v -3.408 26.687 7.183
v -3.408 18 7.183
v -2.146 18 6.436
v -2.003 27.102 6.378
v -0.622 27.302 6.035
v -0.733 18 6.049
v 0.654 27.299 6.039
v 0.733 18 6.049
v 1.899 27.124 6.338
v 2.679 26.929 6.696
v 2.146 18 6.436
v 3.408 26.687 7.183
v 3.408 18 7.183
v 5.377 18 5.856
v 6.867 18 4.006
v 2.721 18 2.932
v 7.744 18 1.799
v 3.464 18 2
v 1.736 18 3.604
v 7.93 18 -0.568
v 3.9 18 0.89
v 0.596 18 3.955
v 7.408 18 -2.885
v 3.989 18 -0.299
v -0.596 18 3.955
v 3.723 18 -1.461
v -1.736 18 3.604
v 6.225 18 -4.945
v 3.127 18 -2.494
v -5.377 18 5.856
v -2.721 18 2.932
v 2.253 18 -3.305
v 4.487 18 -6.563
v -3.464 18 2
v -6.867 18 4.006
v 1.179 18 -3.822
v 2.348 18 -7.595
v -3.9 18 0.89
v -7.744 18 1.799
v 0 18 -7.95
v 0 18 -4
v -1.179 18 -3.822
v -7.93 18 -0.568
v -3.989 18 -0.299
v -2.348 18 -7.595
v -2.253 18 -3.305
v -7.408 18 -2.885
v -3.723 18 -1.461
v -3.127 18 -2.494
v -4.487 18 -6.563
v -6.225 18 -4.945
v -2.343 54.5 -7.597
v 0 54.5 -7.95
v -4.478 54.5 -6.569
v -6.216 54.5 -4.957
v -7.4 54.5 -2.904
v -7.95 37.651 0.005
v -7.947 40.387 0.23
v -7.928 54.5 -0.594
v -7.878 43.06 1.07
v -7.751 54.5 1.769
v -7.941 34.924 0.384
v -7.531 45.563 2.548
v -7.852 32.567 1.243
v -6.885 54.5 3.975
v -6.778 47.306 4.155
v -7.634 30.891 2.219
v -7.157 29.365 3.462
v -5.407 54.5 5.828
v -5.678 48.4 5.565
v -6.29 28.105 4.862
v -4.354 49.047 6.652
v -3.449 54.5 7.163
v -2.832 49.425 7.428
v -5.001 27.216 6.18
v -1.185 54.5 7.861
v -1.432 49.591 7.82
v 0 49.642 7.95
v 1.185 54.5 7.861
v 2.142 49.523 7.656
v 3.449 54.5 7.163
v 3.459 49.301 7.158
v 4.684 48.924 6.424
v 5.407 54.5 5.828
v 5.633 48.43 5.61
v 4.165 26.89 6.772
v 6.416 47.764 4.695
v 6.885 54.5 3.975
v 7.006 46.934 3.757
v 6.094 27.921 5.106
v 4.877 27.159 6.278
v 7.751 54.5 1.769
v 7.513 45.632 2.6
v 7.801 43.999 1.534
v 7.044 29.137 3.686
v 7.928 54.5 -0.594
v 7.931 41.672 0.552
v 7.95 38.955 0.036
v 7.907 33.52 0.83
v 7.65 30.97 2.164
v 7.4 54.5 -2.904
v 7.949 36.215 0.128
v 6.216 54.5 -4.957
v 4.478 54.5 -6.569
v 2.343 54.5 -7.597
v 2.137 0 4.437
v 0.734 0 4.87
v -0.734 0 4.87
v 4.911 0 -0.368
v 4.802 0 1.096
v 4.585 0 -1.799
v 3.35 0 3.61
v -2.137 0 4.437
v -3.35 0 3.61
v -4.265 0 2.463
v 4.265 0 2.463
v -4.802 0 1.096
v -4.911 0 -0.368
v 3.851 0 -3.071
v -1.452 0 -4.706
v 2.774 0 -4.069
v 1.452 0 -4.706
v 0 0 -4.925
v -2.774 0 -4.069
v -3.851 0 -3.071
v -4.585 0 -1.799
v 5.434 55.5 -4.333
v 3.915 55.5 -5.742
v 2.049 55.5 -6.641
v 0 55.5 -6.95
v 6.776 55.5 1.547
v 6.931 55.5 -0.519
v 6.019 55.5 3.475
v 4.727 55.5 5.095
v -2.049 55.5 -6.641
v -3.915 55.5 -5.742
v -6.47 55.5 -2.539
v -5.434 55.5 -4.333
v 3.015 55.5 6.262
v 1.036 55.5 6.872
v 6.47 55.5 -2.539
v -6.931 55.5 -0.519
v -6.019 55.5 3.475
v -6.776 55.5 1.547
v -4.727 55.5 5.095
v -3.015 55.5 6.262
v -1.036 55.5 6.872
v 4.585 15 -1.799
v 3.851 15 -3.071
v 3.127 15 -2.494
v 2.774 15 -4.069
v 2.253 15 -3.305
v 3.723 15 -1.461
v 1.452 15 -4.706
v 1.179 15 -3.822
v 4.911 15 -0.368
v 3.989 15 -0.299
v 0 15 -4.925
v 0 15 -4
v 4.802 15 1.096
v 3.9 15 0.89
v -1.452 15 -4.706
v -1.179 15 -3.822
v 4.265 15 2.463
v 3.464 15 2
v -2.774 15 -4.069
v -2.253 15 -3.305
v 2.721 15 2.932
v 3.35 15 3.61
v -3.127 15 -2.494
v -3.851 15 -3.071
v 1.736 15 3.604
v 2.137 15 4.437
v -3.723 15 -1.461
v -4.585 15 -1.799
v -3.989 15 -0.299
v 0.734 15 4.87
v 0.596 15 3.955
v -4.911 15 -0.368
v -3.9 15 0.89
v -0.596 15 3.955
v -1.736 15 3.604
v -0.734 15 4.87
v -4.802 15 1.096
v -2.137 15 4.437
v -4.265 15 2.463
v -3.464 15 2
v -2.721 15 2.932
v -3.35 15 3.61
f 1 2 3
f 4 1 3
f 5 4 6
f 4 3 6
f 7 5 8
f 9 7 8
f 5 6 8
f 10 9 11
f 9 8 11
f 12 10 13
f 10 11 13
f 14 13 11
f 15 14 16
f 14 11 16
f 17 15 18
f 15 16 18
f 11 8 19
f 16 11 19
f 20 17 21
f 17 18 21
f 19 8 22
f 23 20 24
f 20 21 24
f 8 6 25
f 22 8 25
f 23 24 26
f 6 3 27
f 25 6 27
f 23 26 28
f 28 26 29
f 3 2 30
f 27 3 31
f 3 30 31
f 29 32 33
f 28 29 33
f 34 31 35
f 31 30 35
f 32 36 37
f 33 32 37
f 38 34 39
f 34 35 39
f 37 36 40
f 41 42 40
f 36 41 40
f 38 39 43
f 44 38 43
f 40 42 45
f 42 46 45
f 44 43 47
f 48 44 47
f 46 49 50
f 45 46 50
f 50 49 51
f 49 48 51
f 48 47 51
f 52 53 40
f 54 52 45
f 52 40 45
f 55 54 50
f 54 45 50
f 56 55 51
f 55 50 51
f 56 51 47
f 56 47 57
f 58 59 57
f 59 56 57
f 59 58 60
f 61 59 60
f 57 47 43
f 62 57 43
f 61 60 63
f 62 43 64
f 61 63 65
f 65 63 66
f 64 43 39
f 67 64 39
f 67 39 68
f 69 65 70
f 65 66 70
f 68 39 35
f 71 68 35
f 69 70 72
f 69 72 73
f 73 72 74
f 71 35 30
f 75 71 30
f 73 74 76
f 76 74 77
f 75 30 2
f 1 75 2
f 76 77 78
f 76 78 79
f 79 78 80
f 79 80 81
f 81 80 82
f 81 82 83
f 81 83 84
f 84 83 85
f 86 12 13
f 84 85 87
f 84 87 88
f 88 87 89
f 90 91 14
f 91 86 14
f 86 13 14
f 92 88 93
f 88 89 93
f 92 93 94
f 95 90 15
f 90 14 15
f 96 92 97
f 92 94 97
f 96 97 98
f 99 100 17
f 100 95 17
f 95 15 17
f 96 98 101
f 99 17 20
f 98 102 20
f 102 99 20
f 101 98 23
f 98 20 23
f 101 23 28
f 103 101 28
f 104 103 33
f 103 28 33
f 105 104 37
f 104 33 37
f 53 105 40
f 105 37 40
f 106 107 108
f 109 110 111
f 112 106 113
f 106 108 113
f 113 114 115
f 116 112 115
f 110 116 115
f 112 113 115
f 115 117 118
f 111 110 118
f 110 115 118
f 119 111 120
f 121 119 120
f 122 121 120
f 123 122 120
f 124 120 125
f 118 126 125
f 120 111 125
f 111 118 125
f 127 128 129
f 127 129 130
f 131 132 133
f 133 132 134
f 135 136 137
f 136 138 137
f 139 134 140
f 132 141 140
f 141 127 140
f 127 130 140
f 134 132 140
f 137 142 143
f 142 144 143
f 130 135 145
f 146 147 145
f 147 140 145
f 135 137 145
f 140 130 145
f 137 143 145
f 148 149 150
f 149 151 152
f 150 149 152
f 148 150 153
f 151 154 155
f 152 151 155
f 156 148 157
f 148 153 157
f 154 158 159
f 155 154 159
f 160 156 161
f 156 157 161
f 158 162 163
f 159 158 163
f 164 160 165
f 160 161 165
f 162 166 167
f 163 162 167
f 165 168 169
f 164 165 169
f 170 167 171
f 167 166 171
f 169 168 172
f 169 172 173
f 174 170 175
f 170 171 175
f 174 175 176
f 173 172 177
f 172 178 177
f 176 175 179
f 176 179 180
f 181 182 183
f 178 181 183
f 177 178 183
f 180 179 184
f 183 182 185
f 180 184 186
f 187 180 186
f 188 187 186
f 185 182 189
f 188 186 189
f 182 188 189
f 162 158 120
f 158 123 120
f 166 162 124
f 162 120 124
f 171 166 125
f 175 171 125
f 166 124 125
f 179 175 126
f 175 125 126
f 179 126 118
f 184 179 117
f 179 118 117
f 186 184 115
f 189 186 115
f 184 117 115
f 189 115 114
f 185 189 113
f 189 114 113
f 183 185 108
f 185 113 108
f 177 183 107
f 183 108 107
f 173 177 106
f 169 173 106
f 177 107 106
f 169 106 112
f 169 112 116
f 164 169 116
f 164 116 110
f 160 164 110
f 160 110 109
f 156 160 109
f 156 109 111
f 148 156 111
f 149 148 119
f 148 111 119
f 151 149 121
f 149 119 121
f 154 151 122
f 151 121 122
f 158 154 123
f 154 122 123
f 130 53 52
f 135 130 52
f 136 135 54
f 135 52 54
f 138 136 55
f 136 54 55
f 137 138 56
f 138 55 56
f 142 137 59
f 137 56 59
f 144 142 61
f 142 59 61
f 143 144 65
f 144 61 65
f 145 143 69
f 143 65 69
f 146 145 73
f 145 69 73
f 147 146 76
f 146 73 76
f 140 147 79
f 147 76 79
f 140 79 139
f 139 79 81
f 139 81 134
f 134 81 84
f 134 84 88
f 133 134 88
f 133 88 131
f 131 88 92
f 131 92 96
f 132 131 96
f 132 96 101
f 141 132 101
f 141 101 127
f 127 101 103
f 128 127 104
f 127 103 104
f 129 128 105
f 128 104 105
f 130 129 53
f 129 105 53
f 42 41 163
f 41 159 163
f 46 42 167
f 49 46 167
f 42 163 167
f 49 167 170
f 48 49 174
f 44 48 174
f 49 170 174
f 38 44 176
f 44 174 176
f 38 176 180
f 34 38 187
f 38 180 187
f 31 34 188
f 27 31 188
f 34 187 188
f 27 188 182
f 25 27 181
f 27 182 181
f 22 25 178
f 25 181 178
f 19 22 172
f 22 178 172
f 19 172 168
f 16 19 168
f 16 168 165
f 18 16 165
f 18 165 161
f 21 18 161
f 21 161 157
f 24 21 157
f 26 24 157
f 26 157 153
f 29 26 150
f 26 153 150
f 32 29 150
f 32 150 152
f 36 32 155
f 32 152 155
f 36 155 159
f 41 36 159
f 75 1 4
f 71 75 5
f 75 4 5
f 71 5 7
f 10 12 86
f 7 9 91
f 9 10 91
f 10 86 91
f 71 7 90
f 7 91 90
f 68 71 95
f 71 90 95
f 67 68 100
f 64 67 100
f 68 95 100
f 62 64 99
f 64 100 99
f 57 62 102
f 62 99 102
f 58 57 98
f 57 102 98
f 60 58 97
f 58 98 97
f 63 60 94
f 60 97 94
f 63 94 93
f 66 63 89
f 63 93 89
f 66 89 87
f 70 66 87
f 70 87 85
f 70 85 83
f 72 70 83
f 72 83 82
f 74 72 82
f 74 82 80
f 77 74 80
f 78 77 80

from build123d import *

# Parameters (mm, degrees)
CUT_EXTRUDE1_REACH             = 58.627
SKETCH2_R                      = 12.5
CUT_EXTRUDE1_DIRECTION_2_REACH = 58.627
CUT_EXTRUDE2_REACH             = 41.149
CUT_EXTRUDE2_END_RADIUS        = 12.5
SKETCH3_R                      = 5.5
CHAMFER1_SIZE                  = 1


with BuildPart() as part:
    # Sketch1 → Revolve1 (revolve)
    with BuildSketch(Plane.XY, mode=Mode.PRIVATE) as revolve1_sk:
        Polygon((0, 55.5), (7.95, 55.5), (7.95, 18), (4, 18), (4, 15), (4.925, 15), (4.925, 0), (0, 0), align=None)
    revolve(revolve1_sk.sketch.rotate(Axis((0, 0, 0), (0, 1, 0)), 90), axis=Axis((0, 0, 0), (0, 1, 0)))

    # Sketch2 → Cut-Extrude1 (cut, up to next)
    with BuildSketch(Plane(origin=(0, 0, 0), x_dir=(0, 0, -1), z_dir=(1, 0, 0)), mode=Mode.PRIVATE) as cut_extrude1_sk1:
        with Locations((-12.5, 38)):
            Circle(SKETCH2_R)
    cut_extrude1_tool1 = extrude(cut_extrude1_sk1.sketch, amount=-CUT_EXTRUDE1_REACH, mode=Mode.PRIVATE) & part.part
    add(cut_extrude1_tool1.solids().sort_by_distance((0, 38, 12.5))[0], mode=Mode.SUBTRACT)

    # Sketch2 → Cut-Extrude1 direction 2 (cut, up to next)
    with BuildSketch(Plane(origin=(0, 0, 0), x_dir=(0, 0, -1), z_dir=(1, 0, 0)), mode=Mode.PRIVATE) as cut_extrude1_direction_2_sk1:
        with Locations((-12.5, 38)):
            Circle(SKETCH2_R)
    cut_extrude1_direction_2_tool1 = extrude(cut_extrude1_direction_2_sk1.sketch, amount=CUT_EXTRUDE1_DIRECTION_2_REACH, mode=Mode.PRIVATE) & part.part
    add(cut_extrude1_direction_2_tool1.solids().sort_by_distance((0, 38, 12.5))[0], mode=Mode.SUBTRACT)

    # Cut-Extrude2: up to this cylinder (the profile starts outside it)
    cut_extrude2_end = Plane(origin=(0, 38, 12.5), z_dir=(-1, 0, 0)) * Cylinder(CUT_EXTRUDE2_END_RADIUS, 108.298, mode=Mode.PRIVATE)
    # Sketch3 → Cut-Extrude2 (cut, up to the surface)
    with BuildSketch(Plane.XZ.offset(-18), mode=Mode.PRIVATE) as cut_extrude2_sk1:
        with Locations((0, 11.5)):
            Circle(SKETCH3_R)
    cut_extrude2_tool1 = extrude(cut_extrude2_sk1.sketch, amount=-CUT_EXTRUDE2_REACH, mode=Mode.PRIVATE) - cut_extrude2_end
    add(cut_extrude2_tool1.solids().sort_by_distance((0, 18, 11.5))[0], mode=Mode.SUBTRACT)

    # Chamfer1
    chamfer1_edges = [part.edges().sort_by_distance(p)[0] for p in [
        (0, 55.5, 7.95),
    ]]
    chamfer(chamfer1_edges, length=CHAMFER1_SIZE)


solid = part.part
